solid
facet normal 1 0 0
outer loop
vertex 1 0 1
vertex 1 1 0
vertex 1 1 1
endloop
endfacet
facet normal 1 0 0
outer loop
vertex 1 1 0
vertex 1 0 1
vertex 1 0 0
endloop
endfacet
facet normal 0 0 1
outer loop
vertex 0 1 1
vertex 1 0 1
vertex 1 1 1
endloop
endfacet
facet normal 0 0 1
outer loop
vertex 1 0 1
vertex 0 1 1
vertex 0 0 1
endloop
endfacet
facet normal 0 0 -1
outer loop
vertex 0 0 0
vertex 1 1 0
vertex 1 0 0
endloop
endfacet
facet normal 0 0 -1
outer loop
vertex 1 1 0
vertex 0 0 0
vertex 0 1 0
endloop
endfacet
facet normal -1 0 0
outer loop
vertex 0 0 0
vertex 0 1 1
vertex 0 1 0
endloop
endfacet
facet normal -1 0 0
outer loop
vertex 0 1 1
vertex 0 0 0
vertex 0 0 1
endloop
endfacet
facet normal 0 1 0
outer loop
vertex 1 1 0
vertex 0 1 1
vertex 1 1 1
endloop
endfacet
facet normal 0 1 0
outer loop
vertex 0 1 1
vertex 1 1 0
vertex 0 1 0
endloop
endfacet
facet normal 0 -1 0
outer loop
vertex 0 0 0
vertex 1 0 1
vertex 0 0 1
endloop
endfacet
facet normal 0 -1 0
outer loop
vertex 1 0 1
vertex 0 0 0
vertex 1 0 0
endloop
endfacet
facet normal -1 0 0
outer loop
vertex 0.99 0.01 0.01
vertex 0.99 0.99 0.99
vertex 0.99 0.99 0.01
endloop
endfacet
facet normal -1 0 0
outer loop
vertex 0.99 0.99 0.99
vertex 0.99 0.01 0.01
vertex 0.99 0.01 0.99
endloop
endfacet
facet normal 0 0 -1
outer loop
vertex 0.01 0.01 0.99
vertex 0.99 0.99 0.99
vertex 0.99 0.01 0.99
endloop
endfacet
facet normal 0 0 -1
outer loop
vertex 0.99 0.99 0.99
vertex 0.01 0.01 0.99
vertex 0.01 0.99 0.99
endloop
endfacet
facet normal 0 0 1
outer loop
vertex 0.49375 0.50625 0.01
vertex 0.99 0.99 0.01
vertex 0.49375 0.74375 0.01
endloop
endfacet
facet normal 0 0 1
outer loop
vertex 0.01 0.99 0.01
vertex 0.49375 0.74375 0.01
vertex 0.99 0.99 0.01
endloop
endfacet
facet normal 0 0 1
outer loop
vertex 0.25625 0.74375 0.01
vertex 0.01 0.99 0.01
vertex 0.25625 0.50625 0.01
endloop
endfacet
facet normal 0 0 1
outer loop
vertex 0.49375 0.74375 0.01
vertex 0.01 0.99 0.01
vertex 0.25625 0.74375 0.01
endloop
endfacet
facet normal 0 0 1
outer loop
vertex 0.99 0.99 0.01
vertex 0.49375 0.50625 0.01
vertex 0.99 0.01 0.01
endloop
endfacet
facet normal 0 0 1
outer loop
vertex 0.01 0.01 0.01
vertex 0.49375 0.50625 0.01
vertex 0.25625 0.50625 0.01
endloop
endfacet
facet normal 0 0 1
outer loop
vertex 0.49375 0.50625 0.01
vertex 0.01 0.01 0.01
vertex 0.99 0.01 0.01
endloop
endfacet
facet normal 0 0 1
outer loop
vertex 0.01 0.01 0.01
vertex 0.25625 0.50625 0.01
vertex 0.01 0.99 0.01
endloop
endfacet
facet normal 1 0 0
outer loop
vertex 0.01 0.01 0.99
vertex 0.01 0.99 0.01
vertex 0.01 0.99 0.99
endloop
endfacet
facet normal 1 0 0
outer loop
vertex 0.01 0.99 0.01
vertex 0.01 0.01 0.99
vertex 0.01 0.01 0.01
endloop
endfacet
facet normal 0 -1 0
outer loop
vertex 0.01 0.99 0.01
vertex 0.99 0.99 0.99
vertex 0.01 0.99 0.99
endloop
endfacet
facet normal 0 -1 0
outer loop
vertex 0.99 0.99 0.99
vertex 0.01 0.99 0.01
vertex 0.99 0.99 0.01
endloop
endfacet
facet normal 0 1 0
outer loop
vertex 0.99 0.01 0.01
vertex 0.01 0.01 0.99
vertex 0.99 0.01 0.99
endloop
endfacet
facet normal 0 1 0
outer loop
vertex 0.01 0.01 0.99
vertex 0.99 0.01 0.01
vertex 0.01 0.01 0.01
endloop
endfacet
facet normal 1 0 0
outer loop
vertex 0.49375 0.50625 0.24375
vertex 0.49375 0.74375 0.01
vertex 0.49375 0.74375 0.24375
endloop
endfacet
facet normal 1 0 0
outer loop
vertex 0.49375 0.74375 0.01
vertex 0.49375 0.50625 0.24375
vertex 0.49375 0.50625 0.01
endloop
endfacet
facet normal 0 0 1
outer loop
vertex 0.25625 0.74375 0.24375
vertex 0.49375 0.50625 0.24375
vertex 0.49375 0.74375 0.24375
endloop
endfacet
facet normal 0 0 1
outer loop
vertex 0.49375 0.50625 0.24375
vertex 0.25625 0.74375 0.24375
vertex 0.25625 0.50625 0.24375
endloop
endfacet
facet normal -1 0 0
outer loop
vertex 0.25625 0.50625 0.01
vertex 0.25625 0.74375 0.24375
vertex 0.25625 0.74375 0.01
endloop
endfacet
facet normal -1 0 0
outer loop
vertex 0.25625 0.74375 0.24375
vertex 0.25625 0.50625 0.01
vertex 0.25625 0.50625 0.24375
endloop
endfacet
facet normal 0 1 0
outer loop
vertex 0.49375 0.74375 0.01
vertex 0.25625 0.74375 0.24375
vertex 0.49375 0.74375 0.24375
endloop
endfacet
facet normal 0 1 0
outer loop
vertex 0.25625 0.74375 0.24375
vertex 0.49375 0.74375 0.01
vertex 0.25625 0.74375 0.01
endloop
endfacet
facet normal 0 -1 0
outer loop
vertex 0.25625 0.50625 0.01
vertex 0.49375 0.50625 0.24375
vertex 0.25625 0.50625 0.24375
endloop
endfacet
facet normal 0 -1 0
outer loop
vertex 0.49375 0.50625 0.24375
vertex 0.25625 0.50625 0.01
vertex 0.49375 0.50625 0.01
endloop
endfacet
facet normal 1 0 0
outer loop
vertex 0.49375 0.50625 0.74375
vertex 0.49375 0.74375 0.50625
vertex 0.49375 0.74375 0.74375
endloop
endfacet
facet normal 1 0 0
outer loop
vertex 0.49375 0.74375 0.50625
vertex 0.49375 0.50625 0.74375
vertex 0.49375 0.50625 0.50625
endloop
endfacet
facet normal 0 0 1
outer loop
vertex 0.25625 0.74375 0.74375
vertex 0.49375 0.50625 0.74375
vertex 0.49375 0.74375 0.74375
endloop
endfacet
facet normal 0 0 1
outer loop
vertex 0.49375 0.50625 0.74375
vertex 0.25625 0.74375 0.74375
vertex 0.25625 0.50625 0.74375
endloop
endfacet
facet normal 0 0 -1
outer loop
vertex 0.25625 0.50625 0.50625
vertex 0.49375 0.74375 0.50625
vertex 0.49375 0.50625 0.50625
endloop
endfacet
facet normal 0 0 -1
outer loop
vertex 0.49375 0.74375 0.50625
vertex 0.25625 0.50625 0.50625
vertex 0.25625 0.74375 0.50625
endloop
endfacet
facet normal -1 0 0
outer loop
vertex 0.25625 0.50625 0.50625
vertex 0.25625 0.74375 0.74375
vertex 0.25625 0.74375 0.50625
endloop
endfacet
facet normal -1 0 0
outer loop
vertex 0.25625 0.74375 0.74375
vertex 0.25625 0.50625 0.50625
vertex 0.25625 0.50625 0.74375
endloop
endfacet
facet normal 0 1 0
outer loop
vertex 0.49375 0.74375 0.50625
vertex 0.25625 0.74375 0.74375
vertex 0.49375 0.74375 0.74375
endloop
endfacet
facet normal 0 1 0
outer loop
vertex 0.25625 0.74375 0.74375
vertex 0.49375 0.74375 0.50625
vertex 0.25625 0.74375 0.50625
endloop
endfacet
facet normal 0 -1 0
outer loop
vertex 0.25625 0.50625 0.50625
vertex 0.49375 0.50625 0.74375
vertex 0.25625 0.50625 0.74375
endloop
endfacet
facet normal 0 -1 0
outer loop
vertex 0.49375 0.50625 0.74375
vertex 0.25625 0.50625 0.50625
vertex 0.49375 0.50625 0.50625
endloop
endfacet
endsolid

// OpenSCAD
translate([0.375, 0.625, 0.125]) color([0.10469860556095523, 0.18812002457720967, 0.5206904426516611]) cube([0.2375, 0.2375, 0.2375], center=true);
translate([0.375, 0.625, 0.625]) color([0.9250412107491064, 0.9300014994388205, 0.17453235594062988]) cube([0.2375, 0.2375, 0.2375], center=true);
color([0.3,0.3,0.3,0.3]) difference() { cube([1,1,1]); translate([0.01,0.01,0.01]) cube([0.98,0.98,0.98]); }
